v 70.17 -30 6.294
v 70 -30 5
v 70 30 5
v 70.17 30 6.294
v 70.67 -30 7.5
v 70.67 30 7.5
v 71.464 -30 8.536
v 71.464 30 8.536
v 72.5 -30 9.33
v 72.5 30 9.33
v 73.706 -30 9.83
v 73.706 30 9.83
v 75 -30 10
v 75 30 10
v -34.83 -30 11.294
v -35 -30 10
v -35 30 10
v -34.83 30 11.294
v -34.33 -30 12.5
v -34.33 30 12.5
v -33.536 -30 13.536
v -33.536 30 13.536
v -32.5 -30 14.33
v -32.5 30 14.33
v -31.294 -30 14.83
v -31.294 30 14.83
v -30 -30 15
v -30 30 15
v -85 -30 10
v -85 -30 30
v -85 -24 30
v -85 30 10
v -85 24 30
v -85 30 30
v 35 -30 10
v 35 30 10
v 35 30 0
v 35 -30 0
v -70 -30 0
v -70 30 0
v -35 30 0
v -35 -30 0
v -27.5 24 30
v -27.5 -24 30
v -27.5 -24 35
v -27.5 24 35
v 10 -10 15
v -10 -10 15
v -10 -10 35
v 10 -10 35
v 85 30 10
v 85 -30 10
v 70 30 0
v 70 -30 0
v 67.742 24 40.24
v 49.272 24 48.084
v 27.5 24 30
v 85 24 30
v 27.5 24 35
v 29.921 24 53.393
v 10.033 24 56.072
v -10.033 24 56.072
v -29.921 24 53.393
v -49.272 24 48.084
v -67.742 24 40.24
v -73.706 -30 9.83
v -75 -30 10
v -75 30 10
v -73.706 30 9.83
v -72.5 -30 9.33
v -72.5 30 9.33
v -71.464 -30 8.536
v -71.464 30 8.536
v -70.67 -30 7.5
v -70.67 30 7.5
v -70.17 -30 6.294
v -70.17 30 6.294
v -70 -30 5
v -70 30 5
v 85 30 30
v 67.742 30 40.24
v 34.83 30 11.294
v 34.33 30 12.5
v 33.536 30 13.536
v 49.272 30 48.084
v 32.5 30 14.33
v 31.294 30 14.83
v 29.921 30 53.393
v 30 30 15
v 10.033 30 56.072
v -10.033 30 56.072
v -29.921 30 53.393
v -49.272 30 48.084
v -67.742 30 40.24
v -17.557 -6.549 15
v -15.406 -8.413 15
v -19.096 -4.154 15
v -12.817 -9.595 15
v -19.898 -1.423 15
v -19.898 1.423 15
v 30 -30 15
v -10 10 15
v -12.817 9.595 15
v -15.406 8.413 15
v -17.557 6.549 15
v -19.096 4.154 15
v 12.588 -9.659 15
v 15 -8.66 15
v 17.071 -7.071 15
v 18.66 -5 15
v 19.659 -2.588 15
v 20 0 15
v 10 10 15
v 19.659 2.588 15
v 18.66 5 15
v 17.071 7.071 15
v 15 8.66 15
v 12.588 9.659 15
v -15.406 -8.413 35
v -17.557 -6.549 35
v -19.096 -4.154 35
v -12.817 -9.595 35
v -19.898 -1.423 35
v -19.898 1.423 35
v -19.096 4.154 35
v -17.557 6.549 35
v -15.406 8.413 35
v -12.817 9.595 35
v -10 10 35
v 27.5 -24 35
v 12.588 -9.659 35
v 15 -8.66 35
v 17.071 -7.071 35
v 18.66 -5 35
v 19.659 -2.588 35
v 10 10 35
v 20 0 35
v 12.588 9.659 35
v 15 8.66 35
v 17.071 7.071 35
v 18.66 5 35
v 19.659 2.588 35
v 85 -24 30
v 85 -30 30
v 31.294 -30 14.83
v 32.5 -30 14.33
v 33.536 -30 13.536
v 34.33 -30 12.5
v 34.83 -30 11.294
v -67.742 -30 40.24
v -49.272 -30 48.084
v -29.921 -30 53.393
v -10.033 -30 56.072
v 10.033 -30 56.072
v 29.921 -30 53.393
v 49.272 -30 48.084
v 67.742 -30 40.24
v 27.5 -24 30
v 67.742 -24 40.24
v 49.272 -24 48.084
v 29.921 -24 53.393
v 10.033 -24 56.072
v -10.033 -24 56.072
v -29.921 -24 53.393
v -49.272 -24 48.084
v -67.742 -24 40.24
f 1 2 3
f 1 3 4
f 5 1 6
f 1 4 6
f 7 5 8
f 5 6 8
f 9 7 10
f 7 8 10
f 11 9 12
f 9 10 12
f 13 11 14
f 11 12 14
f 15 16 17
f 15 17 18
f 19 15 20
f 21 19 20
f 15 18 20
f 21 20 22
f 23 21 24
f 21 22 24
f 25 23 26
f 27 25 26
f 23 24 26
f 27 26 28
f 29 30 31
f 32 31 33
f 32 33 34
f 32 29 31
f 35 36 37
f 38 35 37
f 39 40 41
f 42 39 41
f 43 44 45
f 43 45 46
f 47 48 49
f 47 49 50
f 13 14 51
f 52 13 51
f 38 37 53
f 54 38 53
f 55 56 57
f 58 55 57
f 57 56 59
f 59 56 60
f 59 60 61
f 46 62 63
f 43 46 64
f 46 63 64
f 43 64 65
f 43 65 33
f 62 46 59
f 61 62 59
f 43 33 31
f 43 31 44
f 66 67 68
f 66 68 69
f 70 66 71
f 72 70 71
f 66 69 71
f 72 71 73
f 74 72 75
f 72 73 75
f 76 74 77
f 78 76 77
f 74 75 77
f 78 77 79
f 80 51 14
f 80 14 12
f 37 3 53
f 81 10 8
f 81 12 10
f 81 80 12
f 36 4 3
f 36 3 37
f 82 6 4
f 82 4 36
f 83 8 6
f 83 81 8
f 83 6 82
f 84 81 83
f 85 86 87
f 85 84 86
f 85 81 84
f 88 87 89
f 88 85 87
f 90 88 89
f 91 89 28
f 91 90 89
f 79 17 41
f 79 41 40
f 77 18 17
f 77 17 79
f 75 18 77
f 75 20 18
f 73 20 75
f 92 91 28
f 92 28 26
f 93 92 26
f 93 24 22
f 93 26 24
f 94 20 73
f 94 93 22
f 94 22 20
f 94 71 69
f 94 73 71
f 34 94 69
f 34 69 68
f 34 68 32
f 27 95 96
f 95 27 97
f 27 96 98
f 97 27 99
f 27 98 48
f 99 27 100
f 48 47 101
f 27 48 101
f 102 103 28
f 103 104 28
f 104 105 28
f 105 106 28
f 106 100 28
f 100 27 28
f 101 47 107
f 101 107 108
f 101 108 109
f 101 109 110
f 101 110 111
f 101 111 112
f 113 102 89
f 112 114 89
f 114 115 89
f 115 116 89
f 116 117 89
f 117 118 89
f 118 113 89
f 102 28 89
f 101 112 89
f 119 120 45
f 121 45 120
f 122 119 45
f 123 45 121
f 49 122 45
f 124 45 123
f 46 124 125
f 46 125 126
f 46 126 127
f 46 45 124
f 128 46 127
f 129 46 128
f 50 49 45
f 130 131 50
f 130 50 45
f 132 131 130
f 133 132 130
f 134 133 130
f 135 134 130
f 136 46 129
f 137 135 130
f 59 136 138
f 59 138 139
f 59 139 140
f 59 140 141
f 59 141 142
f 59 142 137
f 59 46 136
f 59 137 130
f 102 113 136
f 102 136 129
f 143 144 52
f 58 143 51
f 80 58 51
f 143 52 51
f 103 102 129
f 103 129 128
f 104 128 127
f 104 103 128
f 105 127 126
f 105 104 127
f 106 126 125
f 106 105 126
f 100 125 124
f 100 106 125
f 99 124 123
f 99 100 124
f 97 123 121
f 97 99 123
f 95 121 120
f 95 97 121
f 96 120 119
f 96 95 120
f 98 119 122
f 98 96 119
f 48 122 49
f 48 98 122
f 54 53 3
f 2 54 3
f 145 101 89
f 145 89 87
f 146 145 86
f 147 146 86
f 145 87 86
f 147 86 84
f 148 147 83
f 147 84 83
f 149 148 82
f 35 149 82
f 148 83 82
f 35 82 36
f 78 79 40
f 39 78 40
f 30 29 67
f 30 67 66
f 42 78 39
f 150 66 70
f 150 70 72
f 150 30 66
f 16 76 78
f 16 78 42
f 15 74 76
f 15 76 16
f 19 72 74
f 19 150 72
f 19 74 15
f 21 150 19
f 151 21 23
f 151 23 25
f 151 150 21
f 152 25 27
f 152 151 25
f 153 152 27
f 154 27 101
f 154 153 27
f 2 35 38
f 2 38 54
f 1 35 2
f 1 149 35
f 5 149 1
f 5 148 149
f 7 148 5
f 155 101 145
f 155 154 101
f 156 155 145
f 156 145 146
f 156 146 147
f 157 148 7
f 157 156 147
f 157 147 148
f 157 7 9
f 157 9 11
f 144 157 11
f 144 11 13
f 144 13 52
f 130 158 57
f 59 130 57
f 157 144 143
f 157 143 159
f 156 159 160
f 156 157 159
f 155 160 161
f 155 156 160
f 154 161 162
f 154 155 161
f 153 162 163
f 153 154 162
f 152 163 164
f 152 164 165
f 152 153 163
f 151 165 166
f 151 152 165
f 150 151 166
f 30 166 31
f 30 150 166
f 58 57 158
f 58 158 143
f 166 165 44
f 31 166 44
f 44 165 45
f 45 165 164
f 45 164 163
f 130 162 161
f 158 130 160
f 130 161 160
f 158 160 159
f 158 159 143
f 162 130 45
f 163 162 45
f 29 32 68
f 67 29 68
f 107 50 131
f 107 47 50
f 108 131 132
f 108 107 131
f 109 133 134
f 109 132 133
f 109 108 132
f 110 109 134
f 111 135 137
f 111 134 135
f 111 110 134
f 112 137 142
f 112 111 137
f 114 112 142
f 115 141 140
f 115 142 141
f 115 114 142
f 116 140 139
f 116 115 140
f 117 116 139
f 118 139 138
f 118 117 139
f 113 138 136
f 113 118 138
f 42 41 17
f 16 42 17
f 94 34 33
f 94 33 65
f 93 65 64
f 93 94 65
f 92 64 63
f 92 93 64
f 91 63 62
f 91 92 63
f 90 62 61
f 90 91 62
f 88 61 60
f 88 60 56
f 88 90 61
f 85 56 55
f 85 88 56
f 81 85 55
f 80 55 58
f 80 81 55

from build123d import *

# Parameters (mm, degrees)
F0_W      = 170
F0_H      = 60
F1_DEPTH  = 30
F3_DEPTH  = 30.001
F5_DEPTH  = 60.001
F6_W      = 55
F6_H      = 48
F7_DEPTH  = 5
F8_DEPTH  = 25
F10_DEPTH = 60.001
F13_DEPTH = 6
F14_DEPTH = 6
F17_DEPTH = 6


with BuildPart() as f1:
    # F0 (on Top) → F1 (new body)
    with BuildSketch(Plane.XY):
        Rectangle(F0_W, F0_H)
    extrude(amount=F1_DEPTH)

    # F2 (on face) → F3 (cut, through all)
    with BuildSketch(Plane.XY.offset(30)):
        with BuildLine():
            ThreePointArc((0, 0), (2.9289321881, -7.0710678119), (10, -10))
            Line((10, -10), (10, 10))
            ThreePointArc((10, 10), (2.9289321881, 7.0710678119), (0, 0))
        make_face()
        with BuildLine():
            Line((-10, -10), (10, -10))
            ThreePointArc((10, -10), (2.9289321881, -7.0710678119), (0, 0))
            ThreePointArc((0, 0), (-2.9289321881, -7.0710678119), (-10, -10))
        make_face()
        with BuildLine():
            Line((10, 10), (10, -10))
            ThreePointArc((10, -10), (17.0710678119, -7.0710678119), (20, 0))
            ThreePointArc((20, 0), (17.0710678119, 7.0710678119), (10, 10))
        make_face()
        with BuildLine():
            ThreePointArc((-10, 10), (-20, 0), (-10, -10))
            Line((-10, -10), (-10, 10))
        make_face()
        with BuildLine():
            Line((-10, 10), (-10, -10))
            ThreePointArc((-10, -10), (-2.9289321881, -7.0710678119), (0, 0))
            ThreePointArc((0, 0), (-2.9289321881, 7.0710678119), (-10, 10))
        make_face()
        with BuildLine():
            ThreePointArc((0, 0), (2.9289321881, 7.0710678119), (10, 10))
            Line((10, 10), (-10, 10))
            ThreePointArc((-10, 10), (-2.9289321881, 7.0710678119), (0, 0))
        make_face()
    extrude(amount=-F3_DEPTH, mode=Mode.SUBTRACT)

    # F4 (on face) → F5 (cut, through all)
    with BuildSketch(Plane(origin=(0, 30, 0), x_dir=(-1, 0, 0), z_dir=(0, 1, 0))):
        with BuildLine():
            Line((-35, 0), (0, 0))
            Line((0, 0), (35, 0))
            Line((35, 0), (35, 10))
            ThreePointArc((35, 10), (33.5355339059, 13.5355339059), (30, 15))
            Line((30, 15), (-30, 15))
            ThreePointArc((-30, 15), (-33.5355339059, 13.5355339059), (-35, 10))
            Line((-35, 10), (-35, 0))
        make_face()
    extrude(amount=-F5_DEPTH, mode=Mode.SUBTRACT)

    # F6 (on face) → F7 (join)
    with BuildSketch(Plane.XY.offset(30)):
        Rectangle(F6_W, F6_H)
    extrude(amount=F7_DEPTH)

    # F8 (cut): a face of the model
    f8_faces = [f1.faces().sort_by_distance(p)[0] for p in [
        (0, 0, 30),
    ]]
    extrude(f8_faces, amount=-F8_DEPTH, mode=Mode.SUBTRACT)

    # F9 (on face) → F10 (cut, through all)
    with BuildSketch(Plane(origin=(0, 30, 0), x_dir=(-1, 0, 0), z_dir=(0, 1, 0))):
        with BuildLine():
            Line((85, 0), (85, 10))
            Line((85, 10), (75, 10))
            ThreePointArc((75, 10), (71.4644660941, 8.5355339059), (70, 5))
            Line((70, 5), (70, 0))
            Line((70, 0), (85, 0))
        make_face()
        with BuildLine():
            Line((-85, 10), (-85, 0))
            Line((-85, 0), (-70, 0))
            Line((-70, 0), (-70, 5))
            ThreePointArc((-70, 5), (-71.4644660941, 8.5355339059), (-75, 10))
            Line((-75, 10), (-85, 10))
        make_face()
    extrude(amount=-F10_DEPTH, mode=Mode.SUBTRACT)

    # F12 (on face) → F13 (join)
    with BuildSketch(Plane.XZ.offset(30)):
        with BuildLine():
            Line((-85, 30), (85, 30))
            ThreePointArc((85, 30), (0, 56.4079290569), (-85, 30))
        make_face()
    extrude(amount=-F13_DEPTH)

    # F16 (on face) → F17 (join)
    with BuildSketch(Plane(origin=(0, 30, 0), x_dir=(-1, 0, 0), z_dir=(0, 1, 0))):
        with BuildLine():
            Line((-85, 30), (85, 30))
            ThreePointArc((85, 30), (0, 56.4079290569), (-85, 30))
        make_face()
    extrude(amount=-F17_DEPTH)


with BuildPart() as f14:
    # F11 (on face) → F14 (new body)
    with BuildSketch(Plane(origin=(0, 30, 0), x_dir=(-1, 0, 0), z_dir=(0, 1, 0))):
        with BuildLine():
            Line((-85, 30), (85, 30))
            ThreePointArc((85, 30), (0, 56.4079290569), (-85, 30))
        make_face()
    extrude(amount=-F14_DEPTH)


solid = f1.part
